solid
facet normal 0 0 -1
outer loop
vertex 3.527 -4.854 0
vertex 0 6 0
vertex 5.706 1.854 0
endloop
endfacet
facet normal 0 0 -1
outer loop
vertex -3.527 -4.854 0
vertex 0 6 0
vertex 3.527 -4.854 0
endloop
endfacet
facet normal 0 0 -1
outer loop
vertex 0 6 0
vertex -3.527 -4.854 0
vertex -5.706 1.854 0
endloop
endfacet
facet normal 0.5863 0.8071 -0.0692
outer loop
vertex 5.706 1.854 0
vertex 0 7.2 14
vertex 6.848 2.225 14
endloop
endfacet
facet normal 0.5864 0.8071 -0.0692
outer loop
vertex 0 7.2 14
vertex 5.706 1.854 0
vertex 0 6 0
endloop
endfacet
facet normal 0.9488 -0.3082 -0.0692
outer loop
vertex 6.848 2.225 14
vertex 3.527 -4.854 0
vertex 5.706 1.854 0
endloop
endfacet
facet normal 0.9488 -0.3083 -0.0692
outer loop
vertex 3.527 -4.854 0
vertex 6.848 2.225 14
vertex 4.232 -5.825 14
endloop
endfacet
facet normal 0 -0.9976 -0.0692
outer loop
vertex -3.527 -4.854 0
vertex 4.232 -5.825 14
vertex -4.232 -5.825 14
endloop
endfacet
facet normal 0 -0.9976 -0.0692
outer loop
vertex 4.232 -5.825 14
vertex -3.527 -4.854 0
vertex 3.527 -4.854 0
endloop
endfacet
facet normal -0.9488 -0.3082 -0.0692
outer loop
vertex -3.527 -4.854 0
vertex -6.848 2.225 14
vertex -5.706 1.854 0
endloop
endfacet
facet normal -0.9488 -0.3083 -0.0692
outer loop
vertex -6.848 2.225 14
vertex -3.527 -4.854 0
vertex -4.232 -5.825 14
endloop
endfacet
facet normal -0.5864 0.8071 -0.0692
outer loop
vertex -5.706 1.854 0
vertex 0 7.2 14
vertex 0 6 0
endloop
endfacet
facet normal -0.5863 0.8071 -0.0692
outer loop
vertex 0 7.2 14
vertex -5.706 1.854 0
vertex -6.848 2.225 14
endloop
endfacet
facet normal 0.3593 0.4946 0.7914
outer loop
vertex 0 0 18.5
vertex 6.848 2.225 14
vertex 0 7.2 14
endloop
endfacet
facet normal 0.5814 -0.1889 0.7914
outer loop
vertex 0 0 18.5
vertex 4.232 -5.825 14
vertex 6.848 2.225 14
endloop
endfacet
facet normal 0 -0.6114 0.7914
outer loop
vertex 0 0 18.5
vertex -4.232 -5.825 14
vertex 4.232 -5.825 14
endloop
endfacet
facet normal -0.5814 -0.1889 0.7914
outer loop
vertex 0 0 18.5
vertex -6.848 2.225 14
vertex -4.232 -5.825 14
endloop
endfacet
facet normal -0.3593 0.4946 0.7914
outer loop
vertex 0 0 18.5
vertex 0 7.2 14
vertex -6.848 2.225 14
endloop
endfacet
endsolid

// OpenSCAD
/* [Global] */

// Base Polygon Scale
PolyScale = 1; // [1:30]

// Midpoint Polygon Scale
PolyScale2 = 1; // [1:30]

// Total Height
Height = 1; // [1:30]

// Midpoints' Height  
Height2 = 1; // [1:30]

/* [Hidden] */

s 	= PolyScale;
h 	= Height;
s2 = PolyScale2;
h2 = Height2;

polyhedron
    (points = [[0, 0, 18.5*h], [0, 6*s, 0], [5.7063*s, 1.8541*s, 0], [3.5267*s, -4.8541*s, 0], [-3.5267*s, -4.8541*s, 0], [-5.7063*s, 1.8541*s, 0], [0, 7.2*s2, 14*h2], [6.8476*s2, 2.2249*s2, 14*h2], [4.2320*s2, -5.8249*s2, 14*h2], [-4.2320*s2, -5.8249*s2, 14*h2], [-6.8476*s2, 2.2249*s2, 14*h2]],faces = [[5,4,3,2,1], [1,2,7,6], [2,3,8,7], [3,4,9,8], [4,5,10,9], [5,1,6,10], [6,7,0], [7,8,0], [8,9,0], [9,10,0], [10,6,0]]);
